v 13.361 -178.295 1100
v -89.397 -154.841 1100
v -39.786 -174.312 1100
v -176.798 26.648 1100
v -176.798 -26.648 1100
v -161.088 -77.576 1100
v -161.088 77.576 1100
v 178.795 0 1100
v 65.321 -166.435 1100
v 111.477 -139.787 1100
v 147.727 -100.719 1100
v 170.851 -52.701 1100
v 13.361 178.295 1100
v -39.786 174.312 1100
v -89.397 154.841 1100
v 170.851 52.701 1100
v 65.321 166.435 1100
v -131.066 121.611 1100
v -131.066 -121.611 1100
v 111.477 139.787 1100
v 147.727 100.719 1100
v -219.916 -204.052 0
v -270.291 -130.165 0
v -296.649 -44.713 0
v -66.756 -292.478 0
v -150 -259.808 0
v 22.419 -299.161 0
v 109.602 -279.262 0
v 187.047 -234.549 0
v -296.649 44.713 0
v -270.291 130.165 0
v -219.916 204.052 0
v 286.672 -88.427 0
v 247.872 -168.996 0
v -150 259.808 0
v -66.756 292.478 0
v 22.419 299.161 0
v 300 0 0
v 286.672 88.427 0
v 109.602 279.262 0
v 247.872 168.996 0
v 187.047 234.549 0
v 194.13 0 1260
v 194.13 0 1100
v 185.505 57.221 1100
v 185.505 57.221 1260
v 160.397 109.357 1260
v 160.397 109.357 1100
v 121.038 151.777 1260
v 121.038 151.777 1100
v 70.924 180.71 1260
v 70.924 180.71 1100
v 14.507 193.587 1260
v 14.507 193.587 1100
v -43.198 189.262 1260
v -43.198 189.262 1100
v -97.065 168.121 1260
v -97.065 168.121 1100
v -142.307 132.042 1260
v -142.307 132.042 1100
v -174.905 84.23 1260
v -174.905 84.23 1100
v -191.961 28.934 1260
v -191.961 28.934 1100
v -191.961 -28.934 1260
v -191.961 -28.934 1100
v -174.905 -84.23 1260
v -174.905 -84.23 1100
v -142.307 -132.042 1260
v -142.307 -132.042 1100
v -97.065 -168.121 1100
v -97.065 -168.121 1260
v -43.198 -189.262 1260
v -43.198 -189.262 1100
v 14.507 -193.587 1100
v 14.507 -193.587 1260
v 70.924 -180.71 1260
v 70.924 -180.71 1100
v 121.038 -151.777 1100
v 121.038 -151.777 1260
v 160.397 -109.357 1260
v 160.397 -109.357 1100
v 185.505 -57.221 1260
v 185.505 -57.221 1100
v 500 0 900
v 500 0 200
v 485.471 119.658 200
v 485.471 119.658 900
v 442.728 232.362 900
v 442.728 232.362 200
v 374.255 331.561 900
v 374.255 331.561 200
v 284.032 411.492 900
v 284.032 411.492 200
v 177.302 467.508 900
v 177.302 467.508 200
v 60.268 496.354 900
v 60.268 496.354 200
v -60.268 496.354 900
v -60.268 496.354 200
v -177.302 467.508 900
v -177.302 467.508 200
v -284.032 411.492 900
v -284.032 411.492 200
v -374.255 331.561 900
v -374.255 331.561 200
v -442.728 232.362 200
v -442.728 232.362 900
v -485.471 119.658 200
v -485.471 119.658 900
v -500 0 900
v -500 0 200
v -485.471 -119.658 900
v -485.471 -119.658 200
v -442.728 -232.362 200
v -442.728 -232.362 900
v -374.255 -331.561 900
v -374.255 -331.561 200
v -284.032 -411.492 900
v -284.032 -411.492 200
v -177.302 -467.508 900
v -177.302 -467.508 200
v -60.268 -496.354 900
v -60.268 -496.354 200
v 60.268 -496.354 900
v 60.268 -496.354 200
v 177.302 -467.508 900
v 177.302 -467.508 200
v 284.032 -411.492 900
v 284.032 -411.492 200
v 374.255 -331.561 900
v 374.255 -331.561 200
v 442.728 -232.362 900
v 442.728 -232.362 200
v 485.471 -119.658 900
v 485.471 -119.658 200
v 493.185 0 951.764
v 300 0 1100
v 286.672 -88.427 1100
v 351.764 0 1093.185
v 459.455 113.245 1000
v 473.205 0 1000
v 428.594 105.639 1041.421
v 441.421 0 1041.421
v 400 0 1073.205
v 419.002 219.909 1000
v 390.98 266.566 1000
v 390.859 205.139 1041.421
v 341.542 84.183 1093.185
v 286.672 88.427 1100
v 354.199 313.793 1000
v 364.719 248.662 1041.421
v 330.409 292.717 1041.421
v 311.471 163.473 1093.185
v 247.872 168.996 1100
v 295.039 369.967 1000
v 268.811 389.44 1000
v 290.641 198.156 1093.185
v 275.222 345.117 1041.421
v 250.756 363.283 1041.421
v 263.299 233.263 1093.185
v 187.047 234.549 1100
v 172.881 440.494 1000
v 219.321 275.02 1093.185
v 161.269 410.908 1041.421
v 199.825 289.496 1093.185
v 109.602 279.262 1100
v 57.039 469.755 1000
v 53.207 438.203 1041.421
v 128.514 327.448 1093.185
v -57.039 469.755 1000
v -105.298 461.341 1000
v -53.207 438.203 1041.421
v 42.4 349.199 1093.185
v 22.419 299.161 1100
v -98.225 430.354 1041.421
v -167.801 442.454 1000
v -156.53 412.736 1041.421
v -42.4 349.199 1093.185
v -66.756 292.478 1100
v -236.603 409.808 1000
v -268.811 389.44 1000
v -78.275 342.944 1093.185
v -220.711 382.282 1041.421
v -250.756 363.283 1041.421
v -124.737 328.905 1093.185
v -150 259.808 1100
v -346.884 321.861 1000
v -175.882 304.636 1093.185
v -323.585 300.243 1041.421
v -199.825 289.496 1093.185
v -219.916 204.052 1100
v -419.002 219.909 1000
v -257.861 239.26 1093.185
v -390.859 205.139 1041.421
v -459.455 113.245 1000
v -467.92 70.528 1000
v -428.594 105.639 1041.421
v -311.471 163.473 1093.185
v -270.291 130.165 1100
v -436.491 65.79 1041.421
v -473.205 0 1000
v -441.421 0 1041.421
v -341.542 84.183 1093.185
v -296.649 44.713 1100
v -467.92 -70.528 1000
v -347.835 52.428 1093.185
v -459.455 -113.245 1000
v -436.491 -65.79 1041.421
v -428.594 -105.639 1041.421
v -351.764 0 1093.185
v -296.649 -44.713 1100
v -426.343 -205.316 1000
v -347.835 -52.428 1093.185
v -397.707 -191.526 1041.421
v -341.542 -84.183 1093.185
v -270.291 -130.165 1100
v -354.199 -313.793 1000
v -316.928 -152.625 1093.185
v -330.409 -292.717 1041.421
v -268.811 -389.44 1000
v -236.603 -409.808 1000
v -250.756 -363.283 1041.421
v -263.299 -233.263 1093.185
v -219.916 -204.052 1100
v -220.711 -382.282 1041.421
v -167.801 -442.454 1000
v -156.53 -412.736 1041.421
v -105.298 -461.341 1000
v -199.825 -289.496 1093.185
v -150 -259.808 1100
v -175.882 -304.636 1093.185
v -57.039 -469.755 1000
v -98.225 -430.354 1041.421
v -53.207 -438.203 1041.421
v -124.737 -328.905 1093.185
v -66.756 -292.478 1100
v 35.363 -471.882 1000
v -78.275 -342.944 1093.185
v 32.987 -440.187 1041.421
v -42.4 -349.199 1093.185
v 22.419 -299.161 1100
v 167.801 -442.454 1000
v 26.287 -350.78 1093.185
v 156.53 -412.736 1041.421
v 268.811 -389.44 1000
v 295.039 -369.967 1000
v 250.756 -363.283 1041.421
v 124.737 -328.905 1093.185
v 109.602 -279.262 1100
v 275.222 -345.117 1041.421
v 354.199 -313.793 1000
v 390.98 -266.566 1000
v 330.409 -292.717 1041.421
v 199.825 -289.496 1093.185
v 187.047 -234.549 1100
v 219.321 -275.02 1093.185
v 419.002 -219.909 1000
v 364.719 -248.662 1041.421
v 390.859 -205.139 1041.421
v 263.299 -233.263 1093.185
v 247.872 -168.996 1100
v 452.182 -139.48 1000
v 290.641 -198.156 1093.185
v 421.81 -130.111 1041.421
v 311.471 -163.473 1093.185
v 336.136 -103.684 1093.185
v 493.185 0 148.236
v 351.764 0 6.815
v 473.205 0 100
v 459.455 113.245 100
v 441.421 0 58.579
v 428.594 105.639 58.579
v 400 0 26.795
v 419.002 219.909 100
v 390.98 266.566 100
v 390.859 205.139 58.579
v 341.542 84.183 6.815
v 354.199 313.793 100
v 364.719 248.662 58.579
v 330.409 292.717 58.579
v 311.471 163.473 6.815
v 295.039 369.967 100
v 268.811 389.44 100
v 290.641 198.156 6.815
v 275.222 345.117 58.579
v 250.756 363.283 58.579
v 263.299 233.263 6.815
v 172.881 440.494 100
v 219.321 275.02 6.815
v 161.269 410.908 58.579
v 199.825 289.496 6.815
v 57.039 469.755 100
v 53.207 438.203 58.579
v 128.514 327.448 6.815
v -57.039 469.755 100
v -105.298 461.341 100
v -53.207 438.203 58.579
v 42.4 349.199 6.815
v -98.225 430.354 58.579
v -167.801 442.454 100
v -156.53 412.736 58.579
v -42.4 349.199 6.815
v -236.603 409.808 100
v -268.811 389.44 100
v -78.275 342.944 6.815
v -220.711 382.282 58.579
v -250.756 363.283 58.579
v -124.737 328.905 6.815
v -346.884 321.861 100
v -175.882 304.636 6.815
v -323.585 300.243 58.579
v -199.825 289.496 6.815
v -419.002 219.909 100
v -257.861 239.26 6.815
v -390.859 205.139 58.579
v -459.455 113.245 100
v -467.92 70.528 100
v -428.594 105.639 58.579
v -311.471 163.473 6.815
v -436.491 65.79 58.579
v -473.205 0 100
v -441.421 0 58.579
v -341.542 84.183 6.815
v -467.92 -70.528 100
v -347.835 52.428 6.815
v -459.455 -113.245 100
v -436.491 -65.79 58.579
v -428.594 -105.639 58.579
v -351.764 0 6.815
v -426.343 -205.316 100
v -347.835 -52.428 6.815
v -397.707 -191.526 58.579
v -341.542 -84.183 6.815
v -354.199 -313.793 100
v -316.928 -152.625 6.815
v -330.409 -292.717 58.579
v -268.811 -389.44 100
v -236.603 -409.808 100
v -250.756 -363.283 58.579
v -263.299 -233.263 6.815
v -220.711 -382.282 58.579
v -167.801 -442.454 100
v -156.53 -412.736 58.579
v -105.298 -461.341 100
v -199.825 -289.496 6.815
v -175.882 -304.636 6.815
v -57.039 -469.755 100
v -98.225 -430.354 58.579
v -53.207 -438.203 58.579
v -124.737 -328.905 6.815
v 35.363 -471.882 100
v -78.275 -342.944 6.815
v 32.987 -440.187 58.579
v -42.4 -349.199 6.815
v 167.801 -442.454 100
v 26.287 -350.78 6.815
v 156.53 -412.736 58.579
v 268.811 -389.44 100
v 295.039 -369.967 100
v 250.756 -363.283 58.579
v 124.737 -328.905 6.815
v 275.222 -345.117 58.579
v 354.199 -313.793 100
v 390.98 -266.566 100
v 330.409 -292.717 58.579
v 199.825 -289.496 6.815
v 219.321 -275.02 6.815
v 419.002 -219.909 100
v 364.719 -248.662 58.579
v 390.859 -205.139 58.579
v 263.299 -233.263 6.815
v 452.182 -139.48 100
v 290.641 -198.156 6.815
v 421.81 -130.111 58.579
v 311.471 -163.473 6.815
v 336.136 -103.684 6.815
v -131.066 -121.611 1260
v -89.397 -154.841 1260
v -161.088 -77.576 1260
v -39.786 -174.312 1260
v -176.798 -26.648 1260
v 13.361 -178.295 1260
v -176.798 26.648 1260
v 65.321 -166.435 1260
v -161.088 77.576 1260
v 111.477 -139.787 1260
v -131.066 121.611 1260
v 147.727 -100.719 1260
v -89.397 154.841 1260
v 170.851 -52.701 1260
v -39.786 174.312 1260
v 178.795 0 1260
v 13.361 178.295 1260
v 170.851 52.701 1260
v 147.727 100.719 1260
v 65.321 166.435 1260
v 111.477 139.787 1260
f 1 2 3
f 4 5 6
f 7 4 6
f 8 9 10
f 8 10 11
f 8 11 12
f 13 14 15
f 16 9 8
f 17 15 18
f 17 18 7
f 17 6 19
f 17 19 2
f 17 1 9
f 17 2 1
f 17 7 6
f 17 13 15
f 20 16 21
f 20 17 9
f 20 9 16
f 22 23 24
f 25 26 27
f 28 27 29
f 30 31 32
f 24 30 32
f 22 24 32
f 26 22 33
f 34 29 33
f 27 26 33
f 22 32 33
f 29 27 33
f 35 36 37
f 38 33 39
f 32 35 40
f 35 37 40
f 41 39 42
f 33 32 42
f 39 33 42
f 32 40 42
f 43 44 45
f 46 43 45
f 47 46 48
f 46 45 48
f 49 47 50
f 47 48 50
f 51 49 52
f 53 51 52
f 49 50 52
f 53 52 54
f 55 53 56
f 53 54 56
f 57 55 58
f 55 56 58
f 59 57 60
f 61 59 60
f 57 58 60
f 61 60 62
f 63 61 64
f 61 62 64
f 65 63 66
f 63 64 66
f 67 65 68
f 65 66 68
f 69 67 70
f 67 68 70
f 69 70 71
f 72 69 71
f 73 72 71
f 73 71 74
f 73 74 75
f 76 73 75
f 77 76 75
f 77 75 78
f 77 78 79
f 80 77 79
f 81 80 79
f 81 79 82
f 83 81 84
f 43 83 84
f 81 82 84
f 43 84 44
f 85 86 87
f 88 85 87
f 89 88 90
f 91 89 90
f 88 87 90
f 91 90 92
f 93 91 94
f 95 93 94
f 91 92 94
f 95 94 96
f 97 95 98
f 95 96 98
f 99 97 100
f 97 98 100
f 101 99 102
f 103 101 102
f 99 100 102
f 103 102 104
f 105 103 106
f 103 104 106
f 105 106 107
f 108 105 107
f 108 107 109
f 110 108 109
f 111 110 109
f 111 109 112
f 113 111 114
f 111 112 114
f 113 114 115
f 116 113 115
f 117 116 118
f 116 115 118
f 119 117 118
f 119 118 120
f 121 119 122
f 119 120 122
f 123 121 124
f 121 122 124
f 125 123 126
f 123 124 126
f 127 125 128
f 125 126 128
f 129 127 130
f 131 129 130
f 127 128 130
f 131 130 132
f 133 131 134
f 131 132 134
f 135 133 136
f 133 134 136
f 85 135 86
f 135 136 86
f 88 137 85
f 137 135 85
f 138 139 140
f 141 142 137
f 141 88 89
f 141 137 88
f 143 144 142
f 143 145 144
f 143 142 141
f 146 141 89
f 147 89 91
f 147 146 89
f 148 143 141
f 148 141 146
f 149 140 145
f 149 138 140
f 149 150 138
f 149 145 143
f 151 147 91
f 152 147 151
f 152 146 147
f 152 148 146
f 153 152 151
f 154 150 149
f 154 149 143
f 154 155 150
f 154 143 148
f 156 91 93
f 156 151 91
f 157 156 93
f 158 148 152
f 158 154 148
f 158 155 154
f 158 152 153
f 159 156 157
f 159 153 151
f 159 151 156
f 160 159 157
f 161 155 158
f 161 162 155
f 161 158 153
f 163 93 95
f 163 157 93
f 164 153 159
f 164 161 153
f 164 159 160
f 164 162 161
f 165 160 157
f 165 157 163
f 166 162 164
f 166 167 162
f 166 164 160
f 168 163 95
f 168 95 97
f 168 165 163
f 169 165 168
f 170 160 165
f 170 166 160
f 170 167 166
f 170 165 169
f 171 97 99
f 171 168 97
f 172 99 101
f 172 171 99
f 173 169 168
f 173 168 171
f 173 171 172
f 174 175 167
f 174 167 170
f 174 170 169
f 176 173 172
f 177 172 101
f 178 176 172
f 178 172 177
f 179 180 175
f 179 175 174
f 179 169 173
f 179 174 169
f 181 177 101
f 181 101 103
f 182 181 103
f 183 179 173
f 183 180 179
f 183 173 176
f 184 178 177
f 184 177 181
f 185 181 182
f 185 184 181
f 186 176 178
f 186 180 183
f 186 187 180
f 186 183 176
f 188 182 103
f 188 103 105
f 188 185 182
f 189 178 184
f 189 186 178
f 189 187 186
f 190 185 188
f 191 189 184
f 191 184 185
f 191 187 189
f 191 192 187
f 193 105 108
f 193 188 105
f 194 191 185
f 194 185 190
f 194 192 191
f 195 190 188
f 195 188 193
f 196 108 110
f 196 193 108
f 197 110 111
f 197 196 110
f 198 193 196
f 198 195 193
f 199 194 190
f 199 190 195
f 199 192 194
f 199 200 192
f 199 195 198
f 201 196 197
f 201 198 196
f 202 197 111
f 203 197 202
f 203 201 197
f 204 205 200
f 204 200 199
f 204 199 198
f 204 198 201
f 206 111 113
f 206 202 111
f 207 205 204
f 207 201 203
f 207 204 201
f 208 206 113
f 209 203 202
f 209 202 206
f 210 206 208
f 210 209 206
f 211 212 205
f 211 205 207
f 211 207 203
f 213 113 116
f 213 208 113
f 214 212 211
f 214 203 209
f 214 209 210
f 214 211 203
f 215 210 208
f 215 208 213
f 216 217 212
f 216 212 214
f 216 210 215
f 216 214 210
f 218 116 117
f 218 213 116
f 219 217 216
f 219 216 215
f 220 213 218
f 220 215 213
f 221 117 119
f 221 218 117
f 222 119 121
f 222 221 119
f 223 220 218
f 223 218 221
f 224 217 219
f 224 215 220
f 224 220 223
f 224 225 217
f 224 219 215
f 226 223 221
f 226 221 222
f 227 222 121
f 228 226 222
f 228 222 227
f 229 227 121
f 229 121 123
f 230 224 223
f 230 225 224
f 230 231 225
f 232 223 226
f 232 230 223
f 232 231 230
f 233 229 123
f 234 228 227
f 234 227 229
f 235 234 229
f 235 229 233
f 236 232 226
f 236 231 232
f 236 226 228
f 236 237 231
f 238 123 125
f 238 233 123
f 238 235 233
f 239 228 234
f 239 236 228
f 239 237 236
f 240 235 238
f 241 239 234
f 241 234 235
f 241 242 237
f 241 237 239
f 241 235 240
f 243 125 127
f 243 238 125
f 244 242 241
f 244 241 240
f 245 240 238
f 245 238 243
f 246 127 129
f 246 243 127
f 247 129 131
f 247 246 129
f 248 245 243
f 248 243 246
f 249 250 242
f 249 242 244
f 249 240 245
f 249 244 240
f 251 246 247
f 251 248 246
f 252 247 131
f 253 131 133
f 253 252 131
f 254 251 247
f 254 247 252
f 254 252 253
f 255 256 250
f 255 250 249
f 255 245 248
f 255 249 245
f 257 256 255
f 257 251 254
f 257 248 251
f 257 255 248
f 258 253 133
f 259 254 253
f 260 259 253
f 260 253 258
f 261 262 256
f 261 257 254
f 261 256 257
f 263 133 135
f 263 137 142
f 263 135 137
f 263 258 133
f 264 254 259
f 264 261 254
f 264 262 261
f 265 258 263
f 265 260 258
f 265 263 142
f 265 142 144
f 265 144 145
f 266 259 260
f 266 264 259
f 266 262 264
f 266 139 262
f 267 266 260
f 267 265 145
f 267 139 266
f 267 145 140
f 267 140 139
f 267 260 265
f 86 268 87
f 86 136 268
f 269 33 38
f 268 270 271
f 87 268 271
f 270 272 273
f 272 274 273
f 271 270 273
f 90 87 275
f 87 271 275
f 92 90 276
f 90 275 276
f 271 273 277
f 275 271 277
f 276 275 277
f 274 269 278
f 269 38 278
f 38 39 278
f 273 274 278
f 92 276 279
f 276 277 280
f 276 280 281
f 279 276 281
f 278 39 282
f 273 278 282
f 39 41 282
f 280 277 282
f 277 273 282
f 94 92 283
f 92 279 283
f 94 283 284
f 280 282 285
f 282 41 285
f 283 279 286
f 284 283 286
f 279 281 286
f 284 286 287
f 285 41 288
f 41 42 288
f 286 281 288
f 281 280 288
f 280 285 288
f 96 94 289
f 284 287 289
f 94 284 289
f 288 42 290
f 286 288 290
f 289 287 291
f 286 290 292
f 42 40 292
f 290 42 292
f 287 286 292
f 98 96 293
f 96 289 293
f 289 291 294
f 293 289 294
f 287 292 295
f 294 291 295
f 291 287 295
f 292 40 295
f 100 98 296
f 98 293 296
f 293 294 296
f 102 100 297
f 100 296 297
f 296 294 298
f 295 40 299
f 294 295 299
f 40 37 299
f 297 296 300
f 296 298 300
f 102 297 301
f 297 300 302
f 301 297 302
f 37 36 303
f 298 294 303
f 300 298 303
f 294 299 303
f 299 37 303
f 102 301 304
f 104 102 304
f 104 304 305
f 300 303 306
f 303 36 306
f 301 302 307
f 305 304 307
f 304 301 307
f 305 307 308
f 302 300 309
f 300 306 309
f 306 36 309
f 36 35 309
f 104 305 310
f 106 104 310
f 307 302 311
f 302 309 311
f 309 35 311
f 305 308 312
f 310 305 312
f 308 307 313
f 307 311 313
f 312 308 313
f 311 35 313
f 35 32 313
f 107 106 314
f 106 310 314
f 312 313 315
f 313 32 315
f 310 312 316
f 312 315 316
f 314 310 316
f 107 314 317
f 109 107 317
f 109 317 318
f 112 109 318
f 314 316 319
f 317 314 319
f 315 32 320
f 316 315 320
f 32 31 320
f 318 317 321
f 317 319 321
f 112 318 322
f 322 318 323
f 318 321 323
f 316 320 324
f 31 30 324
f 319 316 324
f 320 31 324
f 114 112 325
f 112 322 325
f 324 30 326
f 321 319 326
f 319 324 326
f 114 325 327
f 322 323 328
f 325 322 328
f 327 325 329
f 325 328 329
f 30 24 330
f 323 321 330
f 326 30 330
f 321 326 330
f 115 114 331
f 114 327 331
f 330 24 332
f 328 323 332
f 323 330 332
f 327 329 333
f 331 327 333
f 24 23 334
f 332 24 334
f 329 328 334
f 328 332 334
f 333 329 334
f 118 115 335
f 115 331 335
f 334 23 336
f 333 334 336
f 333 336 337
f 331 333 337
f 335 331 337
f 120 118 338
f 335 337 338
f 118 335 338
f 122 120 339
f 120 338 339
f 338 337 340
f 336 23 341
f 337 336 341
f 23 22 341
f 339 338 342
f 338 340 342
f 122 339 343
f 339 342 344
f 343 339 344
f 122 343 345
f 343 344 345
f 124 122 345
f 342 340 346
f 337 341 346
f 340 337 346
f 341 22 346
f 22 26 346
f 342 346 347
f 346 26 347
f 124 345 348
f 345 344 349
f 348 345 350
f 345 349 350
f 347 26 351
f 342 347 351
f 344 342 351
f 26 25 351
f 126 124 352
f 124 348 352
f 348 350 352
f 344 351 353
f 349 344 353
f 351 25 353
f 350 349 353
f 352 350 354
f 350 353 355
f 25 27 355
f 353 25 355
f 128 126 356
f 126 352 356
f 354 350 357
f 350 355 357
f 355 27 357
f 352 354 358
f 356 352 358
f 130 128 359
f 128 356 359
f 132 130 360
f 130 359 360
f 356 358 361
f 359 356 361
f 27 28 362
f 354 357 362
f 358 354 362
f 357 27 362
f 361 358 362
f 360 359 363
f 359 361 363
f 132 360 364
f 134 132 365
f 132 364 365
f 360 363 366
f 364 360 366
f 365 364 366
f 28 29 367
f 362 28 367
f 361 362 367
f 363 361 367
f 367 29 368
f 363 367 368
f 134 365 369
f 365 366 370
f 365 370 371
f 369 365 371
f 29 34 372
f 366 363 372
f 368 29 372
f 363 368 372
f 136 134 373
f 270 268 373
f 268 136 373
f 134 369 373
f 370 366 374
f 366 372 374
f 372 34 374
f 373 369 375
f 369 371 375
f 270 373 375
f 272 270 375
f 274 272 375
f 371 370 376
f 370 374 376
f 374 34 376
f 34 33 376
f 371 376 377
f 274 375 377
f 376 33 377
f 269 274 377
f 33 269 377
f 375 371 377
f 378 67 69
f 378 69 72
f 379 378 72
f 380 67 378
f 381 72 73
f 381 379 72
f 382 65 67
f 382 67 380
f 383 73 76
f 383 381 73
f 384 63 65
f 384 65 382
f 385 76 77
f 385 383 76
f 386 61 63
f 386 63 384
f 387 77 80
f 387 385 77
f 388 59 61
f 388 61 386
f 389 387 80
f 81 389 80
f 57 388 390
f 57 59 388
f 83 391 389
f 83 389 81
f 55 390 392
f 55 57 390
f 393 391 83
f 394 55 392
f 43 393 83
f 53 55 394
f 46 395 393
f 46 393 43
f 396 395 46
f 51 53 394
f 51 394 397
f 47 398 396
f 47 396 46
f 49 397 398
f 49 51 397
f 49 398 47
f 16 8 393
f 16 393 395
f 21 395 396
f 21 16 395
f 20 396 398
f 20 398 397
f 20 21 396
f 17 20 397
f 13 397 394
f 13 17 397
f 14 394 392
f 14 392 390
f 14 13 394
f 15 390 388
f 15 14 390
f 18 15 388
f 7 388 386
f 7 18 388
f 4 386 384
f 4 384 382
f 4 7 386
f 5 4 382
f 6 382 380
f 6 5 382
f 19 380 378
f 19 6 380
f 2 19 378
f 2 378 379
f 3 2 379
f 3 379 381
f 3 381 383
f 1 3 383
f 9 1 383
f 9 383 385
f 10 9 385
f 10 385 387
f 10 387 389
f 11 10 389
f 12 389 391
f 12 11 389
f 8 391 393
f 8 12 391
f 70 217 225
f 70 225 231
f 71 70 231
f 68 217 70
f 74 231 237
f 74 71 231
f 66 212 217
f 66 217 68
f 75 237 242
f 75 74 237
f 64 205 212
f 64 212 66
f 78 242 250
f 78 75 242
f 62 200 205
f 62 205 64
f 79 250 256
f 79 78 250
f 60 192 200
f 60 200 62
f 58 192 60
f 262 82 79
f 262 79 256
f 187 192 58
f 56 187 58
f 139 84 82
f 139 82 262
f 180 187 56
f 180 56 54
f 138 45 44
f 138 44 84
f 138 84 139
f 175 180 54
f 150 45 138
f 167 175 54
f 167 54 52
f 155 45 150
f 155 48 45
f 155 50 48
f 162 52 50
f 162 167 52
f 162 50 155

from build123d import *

# Parameters (mm, degrees)
F0_R     = 500
F1_DEPTH = 1100
F2_R     = 200
F3_R     = 194.129707
F3_R_2   = 178.794503
F4_DEPTH = 160


with BuildPart() as f1:
    # F0 (on Top) → F1 (new body)
    with BuildSketch(Plane.XY):
        Circle(F0_R)
    extrude(amount=F1_DEPTH)

    # F2
    f2_edges = [f1.edges().sort_by_distance(p)[0] for p in [
        (-500, 0, 0),
        (-500, 0, 1100),
    ]]
    fillet(f2_edges, radius=F2_R)

    # F3 (on face) → F4 (join)
    with BuildSketch(Plane.XY.offset(1100)):
        Circle(F3_R)
        Circle(F3_R_2, mode=Mode.SUBTRACT)
    extrude(amount=F4_DEPTH)


solid = f1.part
